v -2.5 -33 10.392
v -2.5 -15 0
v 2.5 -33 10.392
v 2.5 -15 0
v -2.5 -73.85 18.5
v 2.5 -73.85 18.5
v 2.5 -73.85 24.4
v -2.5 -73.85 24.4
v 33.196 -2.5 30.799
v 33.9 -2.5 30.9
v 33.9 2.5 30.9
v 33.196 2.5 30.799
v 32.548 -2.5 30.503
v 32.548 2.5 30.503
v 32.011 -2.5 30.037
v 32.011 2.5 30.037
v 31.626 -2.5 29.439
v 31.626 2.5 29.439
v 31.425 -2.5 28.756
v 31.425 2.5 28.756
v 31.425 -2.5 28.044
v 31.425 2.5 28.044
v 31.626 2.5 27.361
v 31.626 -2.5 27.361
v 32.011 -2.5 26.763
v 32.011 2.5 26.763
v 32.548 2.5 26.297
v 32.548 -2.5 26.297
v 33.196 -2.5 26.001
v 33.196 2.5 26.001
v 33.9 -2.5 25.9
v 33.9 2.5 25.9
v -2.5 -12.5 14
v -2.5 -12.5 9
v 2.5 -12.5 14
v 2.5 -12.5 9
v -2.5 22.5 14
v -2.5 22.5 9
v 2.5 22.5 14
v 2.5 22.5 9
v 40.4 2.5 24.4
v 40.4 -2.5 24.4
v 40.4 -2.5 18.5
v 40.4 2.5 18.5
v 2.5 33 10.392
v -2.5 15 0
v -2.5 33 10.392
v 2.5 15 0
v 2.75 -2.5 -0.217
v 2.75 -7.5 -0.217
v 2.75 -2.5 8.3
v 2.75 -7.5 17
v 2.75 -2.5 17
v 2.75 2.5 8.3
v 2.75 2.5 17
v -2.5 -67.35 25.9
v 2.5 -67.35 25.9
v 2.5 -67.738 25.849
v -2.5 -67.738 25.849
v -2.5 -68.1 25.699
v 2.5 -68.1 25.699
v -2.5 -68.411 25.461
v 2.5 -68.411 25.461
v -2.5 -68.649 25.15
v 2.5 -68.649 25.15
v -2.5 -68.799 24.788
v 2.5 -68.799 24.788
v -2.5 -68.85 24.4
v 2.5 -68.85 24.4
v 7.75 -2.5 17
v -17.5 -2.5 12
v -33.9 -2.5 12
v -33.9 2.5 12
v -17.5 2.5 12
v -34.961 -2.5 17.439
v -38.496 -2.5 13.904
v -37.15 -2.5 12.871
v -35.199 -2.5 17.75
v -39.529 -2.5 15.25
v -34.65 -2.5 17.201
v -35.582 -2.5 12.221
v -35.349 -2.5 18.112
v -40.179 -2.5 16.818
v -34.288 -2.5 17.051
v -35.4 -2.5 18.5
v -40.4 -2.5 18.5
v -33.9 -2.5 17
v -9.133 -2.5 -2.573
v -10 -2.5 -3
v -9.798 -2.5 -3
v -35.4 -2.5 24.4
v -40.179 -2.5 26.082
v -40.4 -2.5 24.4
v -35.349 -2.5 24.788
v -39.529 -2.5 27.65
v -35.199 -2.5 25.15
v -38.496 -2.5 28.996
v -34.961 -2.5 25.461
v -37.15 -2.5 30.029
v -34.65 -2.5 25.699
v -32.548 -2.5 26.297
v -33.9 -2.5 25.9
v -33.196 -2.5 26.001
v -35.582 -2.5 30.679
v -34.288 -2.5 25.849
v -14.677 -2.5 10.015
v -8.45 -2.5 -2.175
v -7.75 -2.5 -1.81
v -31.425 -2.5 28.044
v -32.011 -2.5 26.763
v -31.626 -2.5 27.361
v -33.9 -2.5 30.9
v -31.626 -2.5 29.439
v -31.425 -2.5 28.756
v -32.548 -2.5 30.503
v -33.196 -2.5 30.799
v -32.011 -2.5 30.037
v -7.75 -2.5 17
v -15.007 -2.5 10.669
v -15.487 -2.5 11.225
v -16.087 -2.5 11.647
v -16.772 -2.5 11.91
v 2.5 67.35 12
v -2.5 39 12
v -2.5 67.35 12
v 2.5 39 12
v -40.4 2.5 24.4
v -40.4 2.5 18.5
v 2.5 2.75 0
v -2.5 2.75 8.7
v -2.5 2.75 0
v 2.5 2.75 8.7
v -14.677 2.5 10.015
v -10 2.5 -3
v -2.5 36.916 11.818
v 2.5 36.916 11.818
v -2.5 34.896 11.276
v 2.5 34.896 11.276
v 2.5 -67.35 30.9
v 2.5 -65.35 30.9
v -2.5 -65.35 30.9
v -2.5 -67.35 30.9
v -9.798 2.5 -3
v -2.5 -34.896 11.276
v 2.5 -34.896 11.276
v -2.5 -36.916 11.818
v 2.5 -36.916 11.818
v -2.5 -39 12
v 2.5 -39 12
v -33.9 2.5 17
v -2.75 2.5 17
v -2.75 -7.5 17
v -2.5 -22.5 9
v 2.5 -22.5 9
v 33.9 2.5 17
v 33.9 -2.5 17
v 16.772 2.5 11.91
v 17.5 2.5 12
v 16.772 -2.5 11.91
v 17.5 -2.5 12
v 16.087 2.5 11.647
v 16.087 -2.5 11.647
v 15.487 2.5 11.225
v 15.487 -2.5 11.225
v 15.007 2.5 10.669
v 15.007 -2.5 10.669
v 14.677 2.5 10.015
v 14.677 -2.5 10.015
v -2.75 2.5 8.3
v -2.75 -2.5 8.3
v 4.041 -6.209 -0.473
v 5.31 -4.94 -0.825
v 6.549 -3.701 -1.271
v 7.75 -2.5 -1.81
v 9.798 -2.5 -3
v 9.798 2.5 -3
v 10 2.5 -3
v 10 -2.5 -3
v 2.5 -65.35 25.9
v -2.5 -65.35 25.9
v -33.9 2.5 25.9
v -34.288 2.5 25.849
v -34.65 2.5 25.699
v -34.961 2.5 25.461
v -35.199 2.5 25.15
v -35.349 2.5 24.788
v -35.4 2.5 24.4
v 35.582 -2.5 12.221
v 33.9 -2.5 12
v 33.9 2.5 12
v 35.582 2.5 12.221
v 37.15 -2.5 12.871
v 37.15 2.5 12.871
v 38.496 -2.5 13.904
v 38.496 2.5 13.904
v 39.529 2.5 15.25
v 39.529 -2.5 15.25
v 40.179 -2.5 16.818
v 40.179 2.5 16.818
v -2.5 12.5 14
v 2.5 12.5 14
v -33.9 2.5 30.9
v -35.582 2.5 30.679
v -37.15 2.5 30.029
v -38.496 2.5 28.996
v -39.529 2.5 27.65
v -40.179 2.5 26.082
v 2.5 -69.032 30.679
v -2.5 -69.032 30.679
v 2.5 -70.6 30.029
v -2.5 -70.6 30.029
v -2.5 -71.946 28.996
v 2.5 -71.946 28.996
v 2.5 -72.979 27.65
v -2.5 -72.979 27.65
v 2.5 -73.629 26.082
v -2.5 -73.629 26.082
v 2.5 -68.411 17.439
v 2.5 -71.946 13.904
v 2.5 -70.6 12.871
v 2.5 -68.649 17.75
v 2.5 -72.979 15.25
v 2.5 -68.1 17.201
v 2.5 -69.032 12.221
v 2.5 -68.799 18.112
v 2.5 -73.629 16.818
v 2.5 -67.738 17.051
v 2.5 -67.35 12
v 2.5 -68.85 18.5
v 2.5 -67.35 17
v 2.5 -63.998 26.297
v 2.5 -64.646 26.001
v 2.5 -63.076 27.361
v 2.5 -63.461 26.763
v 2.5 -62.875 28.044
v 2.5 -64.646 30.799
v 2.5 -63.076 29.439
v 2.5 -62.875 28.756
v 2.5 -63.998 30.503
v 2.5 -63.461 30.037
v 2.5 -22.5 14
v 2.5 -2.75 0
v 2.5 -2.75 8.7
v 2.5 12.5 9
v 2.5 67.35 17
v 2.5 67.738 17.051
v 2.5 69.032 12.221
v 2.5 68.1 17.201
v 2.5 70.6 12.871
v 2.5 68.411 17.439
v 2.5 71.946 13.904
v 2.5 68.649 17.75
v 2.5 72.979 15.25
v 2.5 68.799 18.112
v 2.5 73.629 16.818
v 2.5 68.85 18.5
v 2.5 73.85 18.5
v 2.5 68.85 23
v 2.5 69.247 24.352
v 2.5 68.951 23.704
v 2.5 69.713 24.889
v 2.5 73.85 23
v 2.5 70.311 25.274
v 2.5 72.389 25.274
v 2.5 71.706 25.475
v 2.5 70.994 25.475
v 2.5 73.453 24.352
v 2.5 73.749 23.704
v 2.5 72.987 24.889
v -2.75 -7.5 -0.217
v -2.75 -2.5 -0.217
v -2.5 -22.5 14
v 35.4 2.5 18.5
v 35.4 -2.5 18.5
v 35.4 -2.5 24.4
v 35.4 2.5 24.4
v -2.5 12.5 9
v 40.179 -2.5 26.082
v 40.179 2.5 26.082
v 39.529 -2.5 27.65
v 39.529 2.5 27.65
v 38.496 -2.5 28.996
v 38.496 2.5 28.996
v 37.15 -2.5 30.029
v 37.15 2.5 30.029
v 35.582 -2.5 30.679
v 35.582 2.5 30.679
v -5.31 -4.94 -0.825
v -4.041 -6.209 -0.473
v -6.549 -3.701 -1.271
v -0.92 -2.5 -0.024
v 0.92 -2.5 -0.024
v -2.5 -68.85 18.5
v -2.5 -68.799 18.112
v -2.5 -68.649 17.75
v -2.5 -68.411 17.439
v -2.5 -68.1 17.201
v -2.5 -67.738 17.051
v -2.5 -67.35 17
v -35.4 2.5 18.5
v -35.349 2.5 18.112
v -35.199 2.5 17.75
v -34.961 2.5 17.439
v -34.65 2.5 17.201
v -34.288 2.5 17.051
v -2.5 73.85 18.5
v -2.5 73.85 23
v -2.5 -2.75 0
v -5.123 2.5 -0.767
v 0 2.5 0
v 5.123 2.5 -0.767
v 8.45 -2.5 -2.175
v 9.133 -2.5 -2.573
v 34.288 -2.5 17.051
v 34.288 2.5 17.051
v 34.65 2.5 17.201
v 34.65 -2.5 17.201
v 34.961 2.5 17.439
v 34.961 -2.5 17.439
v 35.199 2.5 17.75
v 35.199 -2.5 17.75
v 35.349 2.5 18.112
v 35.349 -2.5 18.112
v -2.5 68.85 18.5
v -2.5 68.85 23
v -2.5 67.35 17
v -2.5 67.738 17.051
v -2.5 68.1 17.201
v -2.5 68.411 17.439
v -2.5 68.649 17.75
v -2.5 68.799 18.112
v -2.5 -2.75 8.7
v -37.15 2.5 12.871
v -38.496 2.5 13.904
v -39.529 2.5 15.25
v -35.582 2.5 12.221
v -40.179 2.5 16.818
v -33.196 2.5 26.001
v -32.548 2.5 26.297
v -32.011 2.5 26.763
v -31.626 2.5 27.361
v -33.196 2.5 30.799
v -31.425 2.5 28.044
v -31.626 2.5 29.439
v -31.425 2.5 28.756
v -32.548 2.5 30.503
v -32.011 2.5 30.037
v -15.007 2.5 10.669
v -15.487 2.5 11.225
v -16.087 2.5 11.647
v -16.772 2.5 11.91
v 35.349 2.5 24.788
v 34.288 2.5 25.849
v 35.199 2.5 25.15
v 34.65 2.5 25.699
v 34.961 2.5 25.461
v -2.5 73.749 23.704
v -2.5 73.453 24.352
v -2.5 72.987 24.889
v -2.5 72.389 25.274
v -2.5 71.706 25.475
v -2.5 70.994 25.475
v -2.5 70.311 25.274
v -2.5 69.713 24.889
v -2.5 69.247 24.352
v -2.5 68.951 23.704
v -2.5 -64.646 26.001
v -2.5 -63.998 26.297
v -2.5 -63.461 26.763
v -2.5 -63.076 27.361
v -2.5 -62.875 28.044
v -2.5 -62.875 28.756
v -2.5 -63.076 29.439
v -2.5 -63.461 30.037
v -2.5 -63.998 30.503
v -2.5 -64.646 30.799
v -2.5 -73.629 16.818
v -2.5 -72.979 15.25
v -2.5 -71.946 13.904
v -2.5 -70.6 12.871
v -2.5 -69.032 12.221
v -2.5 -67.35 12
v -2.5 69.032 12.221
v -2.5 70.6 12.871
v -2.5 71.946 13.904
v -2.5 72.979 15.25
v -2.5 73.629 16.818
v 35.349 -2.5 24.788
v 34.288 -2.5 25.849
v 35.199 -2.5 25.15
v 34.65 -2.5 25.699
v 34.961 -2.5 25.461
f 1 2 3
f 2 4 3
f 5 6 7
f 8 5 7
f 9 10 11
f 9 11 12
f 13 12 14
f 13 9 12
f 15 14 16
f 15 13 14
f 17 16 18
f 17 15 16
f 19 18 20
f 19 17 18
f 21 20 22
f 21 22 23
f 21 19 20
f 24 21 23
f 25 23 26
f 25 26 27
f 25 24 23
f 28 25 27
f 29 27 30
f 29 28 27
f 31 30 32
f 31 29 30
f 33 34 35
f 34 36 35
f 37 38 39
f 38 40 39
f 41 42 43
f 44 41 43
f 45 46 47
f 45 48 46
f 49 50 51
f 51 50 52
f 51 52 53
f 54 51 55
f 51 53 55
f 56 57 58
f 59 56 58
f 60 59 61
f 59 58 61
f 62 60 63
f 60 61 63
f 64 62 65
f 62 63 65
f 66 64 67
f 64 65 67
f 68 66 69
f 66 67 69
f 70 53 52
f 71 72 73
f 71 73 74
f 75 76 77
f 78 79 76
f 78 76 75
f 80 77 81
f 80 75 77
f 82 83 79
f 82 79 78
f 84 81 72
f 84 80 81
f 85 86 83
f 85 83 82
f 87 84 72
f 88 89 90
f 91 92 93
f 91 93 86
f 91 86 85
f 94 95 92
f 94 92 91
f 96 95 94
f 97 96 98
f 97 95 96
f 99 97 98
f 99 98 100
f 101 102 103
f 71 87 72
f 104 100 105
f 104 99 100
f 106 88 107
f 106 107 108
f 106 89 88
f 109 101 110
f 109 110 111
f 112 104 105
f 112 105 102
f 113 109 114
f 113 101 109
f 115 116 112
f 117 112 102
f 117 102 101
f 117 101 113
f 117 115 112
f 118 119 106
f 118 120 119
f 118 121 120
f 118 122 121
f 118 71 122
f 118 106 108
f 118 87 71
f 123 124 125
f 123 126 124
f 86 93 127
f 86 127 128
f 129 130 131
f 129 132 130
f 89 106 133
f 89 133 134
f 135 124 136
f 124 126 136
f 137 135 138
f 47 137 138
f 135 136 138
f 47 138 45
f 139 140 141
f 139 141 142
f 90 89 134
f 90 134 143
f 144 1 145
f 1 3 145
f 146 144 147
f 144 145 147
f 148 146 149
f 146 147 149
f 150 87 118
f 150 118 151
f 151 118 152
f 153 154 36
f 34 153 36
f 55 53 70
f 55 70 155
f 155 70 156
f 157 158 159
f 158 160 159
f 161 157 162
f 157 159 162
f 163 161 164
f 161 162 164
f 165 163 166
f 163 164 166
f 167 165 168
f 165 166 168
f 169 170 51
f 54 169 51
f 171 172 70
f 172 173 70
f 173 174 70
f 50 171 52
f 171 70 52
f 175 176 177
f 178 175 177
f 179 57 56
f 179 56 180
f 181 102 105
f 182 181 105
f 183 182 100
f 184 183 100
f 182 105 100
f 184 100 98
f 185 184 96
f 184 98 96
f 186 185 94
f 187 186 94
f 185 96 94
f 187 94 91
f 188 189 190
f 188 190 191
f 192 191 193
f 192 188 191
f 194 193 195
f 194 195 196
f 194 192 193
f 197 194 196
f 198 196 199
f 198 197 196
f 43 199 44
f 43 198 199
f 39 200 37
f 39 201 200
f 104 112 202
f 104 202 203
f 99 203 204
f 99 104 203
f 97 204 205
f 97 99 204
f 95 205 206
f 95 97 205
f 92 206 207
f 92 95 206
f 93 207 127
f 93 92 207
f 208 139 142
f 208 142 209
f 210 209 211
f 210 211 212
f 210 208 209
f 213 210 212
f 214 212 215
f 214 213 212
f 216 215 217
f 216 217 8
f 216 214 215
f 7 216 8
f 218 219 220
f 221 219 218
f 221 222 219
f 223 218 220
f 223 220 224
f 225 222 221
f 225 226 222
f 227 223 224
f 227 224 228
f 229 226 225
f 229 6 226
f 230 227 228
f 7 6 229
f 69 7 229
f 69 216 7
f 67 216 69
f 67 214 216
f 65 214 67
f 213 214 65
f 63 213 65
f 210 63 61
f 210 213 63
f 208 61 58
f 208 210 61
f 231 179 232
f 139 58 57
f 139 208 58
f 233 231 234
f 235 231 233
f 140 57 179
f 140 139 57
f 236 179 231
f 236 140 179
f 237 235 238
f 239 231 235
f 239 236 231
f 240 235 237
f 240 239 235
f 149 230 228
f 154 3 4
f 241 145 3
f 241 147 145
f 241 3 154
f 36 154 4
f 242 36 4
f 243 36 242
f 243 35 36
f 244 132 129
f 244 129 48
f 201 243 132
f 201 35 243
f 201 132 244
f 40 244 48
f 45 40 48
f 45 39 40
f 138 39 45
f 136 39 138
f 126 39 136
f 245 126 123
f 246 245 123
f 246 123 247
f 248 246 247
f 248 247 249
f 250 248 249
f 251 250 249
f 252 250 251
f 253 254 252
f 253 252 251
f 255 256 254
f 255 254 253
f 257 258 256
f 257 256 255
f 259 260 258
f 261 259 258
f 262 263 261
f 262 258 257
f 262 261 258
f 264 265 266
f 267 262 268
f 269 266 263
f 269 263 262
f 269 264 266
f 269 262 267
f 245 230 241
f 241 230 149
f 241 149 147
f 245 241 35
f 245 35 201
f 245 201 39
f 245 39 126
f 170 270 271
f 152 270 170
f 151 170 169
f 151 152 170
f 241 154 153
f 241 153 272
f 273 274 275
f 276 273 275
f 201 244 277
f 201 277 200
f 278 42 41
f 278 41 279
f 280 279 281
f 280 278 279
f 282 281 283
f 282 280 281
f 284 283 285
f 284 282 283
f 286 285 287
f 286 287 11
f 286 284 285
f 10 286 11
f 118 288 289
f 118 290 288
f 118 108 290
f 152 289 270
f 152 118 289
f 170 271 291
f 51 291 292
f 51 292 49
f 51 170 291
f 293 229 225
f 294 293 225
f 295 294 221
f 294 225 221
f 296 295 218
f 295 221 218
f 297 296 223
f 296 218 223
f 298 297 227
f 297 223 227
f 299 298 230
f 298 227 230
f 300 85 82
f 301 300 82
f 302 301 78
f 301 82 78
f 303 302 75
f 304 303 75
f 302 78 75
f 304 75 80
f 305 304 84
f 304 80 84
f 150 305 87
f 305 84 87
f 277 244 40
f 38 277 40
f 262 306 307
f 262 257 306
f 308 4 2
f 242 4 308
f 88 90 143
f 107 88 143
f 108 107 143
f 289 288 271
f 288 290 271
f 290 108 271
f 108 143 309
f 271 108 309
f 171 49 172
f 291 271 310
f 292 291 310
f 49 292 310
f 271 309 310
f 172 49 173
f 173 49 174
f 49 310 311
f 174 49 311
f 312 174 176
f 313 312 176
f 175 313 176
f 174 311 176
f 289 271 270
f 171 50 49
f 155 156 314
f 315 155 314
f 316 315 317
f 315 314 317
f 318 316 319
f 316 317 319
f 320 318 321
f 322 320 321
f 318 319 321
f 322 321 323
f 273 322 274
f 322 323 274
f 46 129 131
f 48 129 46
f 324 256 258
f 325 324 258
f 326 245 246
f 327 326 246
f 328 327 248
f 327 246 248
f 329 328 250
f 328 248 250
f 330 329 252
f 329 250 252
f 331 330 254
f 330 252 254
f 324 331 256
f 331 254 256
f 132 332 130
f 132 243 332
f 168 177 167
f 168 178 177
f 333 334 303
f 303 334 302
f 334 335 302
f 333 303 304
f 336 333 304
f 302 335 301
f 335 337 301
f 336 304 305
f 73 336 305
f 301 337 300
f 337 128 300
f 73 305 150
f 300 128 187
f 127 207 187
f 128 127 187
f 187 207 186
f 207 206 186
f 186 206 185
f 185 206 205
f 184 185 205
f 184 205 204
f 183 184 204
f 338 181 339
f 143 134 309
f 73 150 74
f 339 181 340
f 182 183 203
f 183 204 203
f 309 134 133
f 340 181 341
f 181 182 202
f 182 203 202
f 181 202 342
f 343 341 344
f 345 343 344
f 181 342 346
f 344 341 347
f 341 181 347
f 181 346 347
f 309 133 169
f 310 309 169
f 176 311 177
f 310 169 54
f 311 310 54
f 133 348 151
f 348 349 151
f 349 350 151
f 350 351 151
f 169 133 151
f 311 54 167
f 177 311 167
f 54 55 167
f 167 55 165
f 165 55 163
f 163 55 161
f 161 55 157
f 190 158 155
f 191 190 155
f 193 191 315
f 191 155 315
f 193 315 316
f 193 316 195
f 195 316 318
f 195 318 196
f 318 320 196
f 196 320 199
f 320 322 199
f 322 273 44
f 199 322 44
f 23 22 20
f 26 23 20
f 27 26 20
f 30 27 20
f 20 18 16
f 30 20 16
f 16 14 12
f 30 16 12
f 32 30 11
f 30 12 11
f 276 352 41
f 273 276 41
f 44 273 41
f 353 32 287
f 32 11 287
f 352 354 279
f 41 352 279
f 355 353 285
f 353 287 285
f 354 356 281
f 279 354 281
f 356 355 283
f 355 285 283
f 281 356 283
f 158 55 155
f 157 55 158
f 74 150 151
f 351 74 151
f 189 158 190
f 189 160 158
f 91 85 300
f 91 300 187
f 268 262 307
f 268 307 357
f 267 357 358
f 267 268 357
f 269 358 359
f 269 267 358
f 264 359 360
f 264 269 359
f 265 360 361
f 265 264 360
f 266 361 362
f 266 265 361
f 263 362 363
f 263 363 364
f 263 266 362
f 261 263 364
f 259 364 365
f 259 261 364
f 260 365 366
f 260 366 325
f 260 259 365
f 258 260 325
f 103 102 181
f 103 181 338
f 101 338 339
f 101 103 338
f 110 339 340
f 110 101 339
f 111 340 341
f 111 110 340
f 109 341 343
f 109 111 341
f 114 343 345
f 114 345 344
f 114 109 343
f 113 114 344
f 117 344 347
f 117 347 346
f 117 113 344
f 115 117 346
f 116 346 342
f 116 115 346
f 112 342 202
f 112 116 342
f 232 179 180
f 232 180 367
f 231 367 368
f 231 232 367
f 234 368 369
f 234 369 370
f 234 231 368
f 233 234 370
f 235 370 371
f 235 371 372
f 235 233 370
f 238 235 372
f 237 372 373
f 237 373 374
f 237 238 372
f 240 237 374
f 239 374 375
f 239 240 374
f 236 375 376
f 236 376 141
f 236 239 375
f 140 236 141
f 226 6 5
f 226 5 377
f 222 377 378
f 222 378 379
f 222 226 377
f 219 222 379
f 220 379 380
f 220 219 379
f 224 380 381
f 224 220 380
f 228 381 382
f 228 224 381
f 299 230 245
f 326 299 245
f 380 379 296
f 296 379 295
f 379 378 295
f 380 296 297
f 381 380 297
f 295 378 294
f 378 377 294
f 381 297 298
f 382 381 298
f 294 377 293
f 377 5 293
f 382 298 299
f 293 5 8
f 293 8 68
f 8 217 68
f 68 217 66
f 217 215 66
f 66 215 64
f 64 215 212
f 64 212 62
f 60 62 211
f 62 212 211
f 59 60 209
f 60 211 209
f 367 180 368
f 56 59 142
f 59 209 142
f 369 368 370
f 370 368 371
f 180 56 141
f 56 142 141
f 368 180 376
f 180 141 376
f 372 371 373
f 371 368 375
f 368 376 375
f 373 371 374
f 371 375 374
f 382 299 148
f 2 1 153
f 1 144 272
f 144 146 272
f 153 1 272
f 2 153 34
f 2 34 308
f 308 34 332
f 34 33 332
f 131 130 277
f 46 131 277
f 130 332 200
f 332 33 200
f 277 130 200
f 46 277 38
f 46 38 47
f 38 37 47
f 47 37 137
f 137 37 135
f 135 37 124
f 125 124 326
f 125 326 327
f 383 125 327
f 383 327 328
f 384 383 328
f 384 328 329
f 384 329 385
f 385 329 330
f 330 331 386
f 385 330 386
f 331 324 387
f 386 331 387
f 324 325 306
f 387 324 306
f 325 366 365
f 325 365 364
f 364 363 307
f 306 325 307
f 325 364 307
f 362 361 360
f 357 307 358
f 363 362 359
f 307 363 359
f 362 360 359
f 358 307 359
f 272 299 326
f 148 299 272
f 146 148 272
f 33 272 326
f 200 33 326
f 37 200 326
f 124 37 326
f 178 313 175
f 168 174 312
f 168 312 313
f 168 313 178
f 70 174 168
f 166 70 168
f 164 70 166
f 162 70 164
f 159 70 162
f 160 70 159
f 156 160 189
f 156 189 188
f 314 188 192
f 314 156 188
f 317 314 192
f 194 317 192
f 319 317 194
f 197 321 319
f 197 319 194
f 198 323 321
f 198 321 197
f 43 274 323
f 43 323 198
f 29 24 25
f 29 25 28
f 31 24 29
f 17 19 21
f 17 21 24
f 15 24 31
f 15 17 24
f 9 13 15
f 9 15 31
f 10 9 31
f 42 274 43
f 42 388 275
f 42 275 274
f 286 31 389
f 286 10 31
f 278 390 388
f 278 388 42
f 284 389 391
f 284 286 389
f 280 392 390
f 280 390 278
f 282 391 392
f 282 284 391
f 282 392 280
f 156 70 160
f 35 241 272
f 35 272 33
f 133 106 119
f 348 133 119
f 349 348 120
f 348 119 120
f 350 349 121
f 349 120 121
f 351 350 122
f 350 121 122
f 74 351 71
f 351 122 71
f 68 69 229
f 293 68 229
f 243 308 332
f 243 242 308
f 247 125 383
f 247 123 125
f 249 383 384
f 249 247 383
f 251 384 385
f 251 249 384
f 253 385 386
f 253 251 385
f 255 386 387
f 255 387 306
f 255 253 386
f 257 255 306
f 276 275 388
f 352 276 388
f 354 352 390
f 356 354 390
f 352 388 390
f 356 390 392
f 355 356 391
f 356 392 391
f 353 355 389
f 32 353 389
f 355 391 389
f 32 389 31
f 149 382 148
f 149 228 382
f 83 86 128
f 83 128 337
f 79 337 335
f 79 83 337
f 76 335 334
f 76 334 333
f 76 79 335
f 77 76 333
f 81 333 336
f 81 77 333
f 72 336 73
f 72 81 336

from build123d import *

# Parameters (mm, degrees)
SKETCH_W     = 10
SKETCH_H     = 5
PAD_DEPTH    = 2.5
PAD001_DEPTH = 2.5
PAD002_DEPTH = 20
POCKET_DEPTH = 10


with BuildPart() as vertical:
    # Sketch → Pad (new body, symmetric)
    with BuildSketch(Plane.YZ):
        with BuildLine():
            Line((73.85, 18.500001), (73.85, 22.999997))
            ThreePointArc((73.85, 22.999997), (71.350002, 25.499996), (68.85, 23))
            Line((68.85, 18.499993), (68.85, 23))
            ThreePointArc((67.35, 17), (68.410658, 17.439337), (68.85, 18.499993))
            Line((-67.35, 17), (67.35, 17))
            ThreePointArc((-68.85, 18.499993), (-68.410658, 17.439337), (-67.35, 17))
            Line((-68.85, 24.400007), (-68.85, 18.499993))
            ThreePointArc((-67.35, 25.9), (-68.410658, 25.460663), (-68.85, 24.400007))
            Line((-67.35, 25.9), (-65.35, 25.9))
            ThreePointArc((-65.35, 25.9), (-62.85, 28.399999), (-65.349999, 30.9))
            Line((-65.349999, 30.9), (-67.350003, 30.9))
            ThreePointArc((-67.350003, 30.9), (-71.946195, 28.996193), (-73.85, 24.399999))
            Line((-73.85, 18.499993), (-73.85, 24.399999))
            ThreePointArc((-73.85, 18.499993), (-71.946192, 13.903803), (-67.35, 12))
            Line((-67.35, 12), (-39.000008, 12))
            ThreePointArc((-33, 10.392302), (-35.894175, 11.591109), (-39.000008, 12))
            Line((-15, 0), (-33, 10.392302))
            Line((-15, 0), (-2.75, 0))
            Line((-2.75, 0), (-2.75, 8.7))
            Line((-2.75, 8.7), (2.75, 8.7))
            Line((2.75, 8.7), (2.75, 0))
            Line((2.75, 0), (15, 0))
            Line((15, 0), (33, 10.392302))
            ThreePointArc((39.000008, 12), (35.894175, 11.591109), (33, 10.392302))
            Line((39.000008, 12), (67.35, 12))
            ThreePointArc((67.35, 12), (71.946194, 13.903806), (73.85, 18.500001))
        make_face()
        with Locations((-17.5, 11.5)):
            Rectangle(SKETCH_W, SKETCH_H, mode=Mode.SUBTRACT)
        with Locations((17.5, 11.5)):
            Rectangle(SKETCH_W, SKETCH_H, mode=Mode.SUBTRACT)
    extrude(amount=PAD_DEPTH, both=True)


with BuildPart() as fusion:
    # Sketch001 → Pad001 (new body, symmetric)
    with BuildSketch(Plane.XZ):
        with BuildLine():
            Line((17.5, 12.000015), (33.899995, 12))
            ThreePointArc((33.899995, 12), (38.496192, 13.903804), (40.4, 18.5))
            Line((40.4, 24.400027), (40.4, 18.5))
            ThreePointArc((40.4, 24.400027), (38.496194, 28.996221), (33.9, 30.900026))
            ThreePointArc((33.9, 30.900026), (31.4, 28.400026), (33.9, 25.900026))
            ThreePointArc((35.4, 24.400026), (34.96066, 25.460686), (33.9, 25.900026))
            Line((35.4, 18.500003), (35.4, 24.400026))
            ThreePointArc((33.9, 17), (34.960661, 17.439341), (35.4, 18.500003))
            Line((2.75, 17), (33.9, 17))
            Line((2.75, 8.3), (2.75, 17))
            Line((-2.75, 8.3), (2.75, 8.3))
            Line((-2.75, 17.000015), (-2.75, 8.3))
            Line((-33.9, 17.000015), (-2.75, 17.000015))
            ThreePointArc((-35.4, 18.500003), (-34.960656, 17.439351), (-33.9, 17.000015))
            Line((-35.4, 18.500003), (-35.4, 24.400026))
            ThreePointArc((-33.9, 25.900015), (-34.960656, 25.460679), (-35.4, 24.400026))
            ThreePointArc((-33.9, 25.900015), (-31.4, 28.400015), (-33.9, 30.900015))
            ThreePointArc((-33.9, 30.900015), (-38.49619, 28.996213), (-40.4, 24.400026))
            Line((-40.4, 24.400026), (-40.4, 18.500003))
            ThreePointArc((-40.4, 18.500003), (-38.49619, 13.903817), (-33.900001, 12.000015))
            Line((-33.900001, 12.000015), (-17.5, 12.000015))
            ThreePointArc((-14.676752, 10.014543), (-15.774252, 11.453949), (-17.5, 12.000015))
            Line((-14.676752, 10.014543), (-10, -3))
            Line((-10, -3), (10, -3))
            Line((10, -3), (14.676748, 10.014542))
            ThreePointArc((17.5, 12.000015), (15.77425, 11.453949), (14.676748, 10.014542))
        make_face()
    extrude(amount=PAD001_DEPTH, both=True)

    # Sketch002 → Pad002 (new body)
    with BuildSketch(Plane(origin=(0, 0, 17.000015), x_dir=(-1, 0, 0), z_dir=(0, 0, 1))):
        Polygon((-7.75, 2.5), (-2.75, 7.5), (-2.75, 2.5), align=None)
        Polygon((2.75, 7.5), (2.75, 2.5), (7.75, 2.5), align=None)
    extrude(amount=-PAD002_DEPTH)

    # Sketch003 → Pocket (cut)
    with BuildSketch(Plane(origin=(0, 2.5, 0), x_dir=(1, 0, 0), z_dir=(0, 1, 0))):
        with BuildLine():
            ThreePointArc((-10, 3.138593), (0, 0), (10, 3.138593))
            Line((-10, 3.138593), (10, 3.138593))
        make_face()
    extrude(amount=-POCKET_DEPTH, mode=Mode.SUBTRACT)

    # Fusion: union Vertical
    add(vertical.part)


solid = fusion.part
